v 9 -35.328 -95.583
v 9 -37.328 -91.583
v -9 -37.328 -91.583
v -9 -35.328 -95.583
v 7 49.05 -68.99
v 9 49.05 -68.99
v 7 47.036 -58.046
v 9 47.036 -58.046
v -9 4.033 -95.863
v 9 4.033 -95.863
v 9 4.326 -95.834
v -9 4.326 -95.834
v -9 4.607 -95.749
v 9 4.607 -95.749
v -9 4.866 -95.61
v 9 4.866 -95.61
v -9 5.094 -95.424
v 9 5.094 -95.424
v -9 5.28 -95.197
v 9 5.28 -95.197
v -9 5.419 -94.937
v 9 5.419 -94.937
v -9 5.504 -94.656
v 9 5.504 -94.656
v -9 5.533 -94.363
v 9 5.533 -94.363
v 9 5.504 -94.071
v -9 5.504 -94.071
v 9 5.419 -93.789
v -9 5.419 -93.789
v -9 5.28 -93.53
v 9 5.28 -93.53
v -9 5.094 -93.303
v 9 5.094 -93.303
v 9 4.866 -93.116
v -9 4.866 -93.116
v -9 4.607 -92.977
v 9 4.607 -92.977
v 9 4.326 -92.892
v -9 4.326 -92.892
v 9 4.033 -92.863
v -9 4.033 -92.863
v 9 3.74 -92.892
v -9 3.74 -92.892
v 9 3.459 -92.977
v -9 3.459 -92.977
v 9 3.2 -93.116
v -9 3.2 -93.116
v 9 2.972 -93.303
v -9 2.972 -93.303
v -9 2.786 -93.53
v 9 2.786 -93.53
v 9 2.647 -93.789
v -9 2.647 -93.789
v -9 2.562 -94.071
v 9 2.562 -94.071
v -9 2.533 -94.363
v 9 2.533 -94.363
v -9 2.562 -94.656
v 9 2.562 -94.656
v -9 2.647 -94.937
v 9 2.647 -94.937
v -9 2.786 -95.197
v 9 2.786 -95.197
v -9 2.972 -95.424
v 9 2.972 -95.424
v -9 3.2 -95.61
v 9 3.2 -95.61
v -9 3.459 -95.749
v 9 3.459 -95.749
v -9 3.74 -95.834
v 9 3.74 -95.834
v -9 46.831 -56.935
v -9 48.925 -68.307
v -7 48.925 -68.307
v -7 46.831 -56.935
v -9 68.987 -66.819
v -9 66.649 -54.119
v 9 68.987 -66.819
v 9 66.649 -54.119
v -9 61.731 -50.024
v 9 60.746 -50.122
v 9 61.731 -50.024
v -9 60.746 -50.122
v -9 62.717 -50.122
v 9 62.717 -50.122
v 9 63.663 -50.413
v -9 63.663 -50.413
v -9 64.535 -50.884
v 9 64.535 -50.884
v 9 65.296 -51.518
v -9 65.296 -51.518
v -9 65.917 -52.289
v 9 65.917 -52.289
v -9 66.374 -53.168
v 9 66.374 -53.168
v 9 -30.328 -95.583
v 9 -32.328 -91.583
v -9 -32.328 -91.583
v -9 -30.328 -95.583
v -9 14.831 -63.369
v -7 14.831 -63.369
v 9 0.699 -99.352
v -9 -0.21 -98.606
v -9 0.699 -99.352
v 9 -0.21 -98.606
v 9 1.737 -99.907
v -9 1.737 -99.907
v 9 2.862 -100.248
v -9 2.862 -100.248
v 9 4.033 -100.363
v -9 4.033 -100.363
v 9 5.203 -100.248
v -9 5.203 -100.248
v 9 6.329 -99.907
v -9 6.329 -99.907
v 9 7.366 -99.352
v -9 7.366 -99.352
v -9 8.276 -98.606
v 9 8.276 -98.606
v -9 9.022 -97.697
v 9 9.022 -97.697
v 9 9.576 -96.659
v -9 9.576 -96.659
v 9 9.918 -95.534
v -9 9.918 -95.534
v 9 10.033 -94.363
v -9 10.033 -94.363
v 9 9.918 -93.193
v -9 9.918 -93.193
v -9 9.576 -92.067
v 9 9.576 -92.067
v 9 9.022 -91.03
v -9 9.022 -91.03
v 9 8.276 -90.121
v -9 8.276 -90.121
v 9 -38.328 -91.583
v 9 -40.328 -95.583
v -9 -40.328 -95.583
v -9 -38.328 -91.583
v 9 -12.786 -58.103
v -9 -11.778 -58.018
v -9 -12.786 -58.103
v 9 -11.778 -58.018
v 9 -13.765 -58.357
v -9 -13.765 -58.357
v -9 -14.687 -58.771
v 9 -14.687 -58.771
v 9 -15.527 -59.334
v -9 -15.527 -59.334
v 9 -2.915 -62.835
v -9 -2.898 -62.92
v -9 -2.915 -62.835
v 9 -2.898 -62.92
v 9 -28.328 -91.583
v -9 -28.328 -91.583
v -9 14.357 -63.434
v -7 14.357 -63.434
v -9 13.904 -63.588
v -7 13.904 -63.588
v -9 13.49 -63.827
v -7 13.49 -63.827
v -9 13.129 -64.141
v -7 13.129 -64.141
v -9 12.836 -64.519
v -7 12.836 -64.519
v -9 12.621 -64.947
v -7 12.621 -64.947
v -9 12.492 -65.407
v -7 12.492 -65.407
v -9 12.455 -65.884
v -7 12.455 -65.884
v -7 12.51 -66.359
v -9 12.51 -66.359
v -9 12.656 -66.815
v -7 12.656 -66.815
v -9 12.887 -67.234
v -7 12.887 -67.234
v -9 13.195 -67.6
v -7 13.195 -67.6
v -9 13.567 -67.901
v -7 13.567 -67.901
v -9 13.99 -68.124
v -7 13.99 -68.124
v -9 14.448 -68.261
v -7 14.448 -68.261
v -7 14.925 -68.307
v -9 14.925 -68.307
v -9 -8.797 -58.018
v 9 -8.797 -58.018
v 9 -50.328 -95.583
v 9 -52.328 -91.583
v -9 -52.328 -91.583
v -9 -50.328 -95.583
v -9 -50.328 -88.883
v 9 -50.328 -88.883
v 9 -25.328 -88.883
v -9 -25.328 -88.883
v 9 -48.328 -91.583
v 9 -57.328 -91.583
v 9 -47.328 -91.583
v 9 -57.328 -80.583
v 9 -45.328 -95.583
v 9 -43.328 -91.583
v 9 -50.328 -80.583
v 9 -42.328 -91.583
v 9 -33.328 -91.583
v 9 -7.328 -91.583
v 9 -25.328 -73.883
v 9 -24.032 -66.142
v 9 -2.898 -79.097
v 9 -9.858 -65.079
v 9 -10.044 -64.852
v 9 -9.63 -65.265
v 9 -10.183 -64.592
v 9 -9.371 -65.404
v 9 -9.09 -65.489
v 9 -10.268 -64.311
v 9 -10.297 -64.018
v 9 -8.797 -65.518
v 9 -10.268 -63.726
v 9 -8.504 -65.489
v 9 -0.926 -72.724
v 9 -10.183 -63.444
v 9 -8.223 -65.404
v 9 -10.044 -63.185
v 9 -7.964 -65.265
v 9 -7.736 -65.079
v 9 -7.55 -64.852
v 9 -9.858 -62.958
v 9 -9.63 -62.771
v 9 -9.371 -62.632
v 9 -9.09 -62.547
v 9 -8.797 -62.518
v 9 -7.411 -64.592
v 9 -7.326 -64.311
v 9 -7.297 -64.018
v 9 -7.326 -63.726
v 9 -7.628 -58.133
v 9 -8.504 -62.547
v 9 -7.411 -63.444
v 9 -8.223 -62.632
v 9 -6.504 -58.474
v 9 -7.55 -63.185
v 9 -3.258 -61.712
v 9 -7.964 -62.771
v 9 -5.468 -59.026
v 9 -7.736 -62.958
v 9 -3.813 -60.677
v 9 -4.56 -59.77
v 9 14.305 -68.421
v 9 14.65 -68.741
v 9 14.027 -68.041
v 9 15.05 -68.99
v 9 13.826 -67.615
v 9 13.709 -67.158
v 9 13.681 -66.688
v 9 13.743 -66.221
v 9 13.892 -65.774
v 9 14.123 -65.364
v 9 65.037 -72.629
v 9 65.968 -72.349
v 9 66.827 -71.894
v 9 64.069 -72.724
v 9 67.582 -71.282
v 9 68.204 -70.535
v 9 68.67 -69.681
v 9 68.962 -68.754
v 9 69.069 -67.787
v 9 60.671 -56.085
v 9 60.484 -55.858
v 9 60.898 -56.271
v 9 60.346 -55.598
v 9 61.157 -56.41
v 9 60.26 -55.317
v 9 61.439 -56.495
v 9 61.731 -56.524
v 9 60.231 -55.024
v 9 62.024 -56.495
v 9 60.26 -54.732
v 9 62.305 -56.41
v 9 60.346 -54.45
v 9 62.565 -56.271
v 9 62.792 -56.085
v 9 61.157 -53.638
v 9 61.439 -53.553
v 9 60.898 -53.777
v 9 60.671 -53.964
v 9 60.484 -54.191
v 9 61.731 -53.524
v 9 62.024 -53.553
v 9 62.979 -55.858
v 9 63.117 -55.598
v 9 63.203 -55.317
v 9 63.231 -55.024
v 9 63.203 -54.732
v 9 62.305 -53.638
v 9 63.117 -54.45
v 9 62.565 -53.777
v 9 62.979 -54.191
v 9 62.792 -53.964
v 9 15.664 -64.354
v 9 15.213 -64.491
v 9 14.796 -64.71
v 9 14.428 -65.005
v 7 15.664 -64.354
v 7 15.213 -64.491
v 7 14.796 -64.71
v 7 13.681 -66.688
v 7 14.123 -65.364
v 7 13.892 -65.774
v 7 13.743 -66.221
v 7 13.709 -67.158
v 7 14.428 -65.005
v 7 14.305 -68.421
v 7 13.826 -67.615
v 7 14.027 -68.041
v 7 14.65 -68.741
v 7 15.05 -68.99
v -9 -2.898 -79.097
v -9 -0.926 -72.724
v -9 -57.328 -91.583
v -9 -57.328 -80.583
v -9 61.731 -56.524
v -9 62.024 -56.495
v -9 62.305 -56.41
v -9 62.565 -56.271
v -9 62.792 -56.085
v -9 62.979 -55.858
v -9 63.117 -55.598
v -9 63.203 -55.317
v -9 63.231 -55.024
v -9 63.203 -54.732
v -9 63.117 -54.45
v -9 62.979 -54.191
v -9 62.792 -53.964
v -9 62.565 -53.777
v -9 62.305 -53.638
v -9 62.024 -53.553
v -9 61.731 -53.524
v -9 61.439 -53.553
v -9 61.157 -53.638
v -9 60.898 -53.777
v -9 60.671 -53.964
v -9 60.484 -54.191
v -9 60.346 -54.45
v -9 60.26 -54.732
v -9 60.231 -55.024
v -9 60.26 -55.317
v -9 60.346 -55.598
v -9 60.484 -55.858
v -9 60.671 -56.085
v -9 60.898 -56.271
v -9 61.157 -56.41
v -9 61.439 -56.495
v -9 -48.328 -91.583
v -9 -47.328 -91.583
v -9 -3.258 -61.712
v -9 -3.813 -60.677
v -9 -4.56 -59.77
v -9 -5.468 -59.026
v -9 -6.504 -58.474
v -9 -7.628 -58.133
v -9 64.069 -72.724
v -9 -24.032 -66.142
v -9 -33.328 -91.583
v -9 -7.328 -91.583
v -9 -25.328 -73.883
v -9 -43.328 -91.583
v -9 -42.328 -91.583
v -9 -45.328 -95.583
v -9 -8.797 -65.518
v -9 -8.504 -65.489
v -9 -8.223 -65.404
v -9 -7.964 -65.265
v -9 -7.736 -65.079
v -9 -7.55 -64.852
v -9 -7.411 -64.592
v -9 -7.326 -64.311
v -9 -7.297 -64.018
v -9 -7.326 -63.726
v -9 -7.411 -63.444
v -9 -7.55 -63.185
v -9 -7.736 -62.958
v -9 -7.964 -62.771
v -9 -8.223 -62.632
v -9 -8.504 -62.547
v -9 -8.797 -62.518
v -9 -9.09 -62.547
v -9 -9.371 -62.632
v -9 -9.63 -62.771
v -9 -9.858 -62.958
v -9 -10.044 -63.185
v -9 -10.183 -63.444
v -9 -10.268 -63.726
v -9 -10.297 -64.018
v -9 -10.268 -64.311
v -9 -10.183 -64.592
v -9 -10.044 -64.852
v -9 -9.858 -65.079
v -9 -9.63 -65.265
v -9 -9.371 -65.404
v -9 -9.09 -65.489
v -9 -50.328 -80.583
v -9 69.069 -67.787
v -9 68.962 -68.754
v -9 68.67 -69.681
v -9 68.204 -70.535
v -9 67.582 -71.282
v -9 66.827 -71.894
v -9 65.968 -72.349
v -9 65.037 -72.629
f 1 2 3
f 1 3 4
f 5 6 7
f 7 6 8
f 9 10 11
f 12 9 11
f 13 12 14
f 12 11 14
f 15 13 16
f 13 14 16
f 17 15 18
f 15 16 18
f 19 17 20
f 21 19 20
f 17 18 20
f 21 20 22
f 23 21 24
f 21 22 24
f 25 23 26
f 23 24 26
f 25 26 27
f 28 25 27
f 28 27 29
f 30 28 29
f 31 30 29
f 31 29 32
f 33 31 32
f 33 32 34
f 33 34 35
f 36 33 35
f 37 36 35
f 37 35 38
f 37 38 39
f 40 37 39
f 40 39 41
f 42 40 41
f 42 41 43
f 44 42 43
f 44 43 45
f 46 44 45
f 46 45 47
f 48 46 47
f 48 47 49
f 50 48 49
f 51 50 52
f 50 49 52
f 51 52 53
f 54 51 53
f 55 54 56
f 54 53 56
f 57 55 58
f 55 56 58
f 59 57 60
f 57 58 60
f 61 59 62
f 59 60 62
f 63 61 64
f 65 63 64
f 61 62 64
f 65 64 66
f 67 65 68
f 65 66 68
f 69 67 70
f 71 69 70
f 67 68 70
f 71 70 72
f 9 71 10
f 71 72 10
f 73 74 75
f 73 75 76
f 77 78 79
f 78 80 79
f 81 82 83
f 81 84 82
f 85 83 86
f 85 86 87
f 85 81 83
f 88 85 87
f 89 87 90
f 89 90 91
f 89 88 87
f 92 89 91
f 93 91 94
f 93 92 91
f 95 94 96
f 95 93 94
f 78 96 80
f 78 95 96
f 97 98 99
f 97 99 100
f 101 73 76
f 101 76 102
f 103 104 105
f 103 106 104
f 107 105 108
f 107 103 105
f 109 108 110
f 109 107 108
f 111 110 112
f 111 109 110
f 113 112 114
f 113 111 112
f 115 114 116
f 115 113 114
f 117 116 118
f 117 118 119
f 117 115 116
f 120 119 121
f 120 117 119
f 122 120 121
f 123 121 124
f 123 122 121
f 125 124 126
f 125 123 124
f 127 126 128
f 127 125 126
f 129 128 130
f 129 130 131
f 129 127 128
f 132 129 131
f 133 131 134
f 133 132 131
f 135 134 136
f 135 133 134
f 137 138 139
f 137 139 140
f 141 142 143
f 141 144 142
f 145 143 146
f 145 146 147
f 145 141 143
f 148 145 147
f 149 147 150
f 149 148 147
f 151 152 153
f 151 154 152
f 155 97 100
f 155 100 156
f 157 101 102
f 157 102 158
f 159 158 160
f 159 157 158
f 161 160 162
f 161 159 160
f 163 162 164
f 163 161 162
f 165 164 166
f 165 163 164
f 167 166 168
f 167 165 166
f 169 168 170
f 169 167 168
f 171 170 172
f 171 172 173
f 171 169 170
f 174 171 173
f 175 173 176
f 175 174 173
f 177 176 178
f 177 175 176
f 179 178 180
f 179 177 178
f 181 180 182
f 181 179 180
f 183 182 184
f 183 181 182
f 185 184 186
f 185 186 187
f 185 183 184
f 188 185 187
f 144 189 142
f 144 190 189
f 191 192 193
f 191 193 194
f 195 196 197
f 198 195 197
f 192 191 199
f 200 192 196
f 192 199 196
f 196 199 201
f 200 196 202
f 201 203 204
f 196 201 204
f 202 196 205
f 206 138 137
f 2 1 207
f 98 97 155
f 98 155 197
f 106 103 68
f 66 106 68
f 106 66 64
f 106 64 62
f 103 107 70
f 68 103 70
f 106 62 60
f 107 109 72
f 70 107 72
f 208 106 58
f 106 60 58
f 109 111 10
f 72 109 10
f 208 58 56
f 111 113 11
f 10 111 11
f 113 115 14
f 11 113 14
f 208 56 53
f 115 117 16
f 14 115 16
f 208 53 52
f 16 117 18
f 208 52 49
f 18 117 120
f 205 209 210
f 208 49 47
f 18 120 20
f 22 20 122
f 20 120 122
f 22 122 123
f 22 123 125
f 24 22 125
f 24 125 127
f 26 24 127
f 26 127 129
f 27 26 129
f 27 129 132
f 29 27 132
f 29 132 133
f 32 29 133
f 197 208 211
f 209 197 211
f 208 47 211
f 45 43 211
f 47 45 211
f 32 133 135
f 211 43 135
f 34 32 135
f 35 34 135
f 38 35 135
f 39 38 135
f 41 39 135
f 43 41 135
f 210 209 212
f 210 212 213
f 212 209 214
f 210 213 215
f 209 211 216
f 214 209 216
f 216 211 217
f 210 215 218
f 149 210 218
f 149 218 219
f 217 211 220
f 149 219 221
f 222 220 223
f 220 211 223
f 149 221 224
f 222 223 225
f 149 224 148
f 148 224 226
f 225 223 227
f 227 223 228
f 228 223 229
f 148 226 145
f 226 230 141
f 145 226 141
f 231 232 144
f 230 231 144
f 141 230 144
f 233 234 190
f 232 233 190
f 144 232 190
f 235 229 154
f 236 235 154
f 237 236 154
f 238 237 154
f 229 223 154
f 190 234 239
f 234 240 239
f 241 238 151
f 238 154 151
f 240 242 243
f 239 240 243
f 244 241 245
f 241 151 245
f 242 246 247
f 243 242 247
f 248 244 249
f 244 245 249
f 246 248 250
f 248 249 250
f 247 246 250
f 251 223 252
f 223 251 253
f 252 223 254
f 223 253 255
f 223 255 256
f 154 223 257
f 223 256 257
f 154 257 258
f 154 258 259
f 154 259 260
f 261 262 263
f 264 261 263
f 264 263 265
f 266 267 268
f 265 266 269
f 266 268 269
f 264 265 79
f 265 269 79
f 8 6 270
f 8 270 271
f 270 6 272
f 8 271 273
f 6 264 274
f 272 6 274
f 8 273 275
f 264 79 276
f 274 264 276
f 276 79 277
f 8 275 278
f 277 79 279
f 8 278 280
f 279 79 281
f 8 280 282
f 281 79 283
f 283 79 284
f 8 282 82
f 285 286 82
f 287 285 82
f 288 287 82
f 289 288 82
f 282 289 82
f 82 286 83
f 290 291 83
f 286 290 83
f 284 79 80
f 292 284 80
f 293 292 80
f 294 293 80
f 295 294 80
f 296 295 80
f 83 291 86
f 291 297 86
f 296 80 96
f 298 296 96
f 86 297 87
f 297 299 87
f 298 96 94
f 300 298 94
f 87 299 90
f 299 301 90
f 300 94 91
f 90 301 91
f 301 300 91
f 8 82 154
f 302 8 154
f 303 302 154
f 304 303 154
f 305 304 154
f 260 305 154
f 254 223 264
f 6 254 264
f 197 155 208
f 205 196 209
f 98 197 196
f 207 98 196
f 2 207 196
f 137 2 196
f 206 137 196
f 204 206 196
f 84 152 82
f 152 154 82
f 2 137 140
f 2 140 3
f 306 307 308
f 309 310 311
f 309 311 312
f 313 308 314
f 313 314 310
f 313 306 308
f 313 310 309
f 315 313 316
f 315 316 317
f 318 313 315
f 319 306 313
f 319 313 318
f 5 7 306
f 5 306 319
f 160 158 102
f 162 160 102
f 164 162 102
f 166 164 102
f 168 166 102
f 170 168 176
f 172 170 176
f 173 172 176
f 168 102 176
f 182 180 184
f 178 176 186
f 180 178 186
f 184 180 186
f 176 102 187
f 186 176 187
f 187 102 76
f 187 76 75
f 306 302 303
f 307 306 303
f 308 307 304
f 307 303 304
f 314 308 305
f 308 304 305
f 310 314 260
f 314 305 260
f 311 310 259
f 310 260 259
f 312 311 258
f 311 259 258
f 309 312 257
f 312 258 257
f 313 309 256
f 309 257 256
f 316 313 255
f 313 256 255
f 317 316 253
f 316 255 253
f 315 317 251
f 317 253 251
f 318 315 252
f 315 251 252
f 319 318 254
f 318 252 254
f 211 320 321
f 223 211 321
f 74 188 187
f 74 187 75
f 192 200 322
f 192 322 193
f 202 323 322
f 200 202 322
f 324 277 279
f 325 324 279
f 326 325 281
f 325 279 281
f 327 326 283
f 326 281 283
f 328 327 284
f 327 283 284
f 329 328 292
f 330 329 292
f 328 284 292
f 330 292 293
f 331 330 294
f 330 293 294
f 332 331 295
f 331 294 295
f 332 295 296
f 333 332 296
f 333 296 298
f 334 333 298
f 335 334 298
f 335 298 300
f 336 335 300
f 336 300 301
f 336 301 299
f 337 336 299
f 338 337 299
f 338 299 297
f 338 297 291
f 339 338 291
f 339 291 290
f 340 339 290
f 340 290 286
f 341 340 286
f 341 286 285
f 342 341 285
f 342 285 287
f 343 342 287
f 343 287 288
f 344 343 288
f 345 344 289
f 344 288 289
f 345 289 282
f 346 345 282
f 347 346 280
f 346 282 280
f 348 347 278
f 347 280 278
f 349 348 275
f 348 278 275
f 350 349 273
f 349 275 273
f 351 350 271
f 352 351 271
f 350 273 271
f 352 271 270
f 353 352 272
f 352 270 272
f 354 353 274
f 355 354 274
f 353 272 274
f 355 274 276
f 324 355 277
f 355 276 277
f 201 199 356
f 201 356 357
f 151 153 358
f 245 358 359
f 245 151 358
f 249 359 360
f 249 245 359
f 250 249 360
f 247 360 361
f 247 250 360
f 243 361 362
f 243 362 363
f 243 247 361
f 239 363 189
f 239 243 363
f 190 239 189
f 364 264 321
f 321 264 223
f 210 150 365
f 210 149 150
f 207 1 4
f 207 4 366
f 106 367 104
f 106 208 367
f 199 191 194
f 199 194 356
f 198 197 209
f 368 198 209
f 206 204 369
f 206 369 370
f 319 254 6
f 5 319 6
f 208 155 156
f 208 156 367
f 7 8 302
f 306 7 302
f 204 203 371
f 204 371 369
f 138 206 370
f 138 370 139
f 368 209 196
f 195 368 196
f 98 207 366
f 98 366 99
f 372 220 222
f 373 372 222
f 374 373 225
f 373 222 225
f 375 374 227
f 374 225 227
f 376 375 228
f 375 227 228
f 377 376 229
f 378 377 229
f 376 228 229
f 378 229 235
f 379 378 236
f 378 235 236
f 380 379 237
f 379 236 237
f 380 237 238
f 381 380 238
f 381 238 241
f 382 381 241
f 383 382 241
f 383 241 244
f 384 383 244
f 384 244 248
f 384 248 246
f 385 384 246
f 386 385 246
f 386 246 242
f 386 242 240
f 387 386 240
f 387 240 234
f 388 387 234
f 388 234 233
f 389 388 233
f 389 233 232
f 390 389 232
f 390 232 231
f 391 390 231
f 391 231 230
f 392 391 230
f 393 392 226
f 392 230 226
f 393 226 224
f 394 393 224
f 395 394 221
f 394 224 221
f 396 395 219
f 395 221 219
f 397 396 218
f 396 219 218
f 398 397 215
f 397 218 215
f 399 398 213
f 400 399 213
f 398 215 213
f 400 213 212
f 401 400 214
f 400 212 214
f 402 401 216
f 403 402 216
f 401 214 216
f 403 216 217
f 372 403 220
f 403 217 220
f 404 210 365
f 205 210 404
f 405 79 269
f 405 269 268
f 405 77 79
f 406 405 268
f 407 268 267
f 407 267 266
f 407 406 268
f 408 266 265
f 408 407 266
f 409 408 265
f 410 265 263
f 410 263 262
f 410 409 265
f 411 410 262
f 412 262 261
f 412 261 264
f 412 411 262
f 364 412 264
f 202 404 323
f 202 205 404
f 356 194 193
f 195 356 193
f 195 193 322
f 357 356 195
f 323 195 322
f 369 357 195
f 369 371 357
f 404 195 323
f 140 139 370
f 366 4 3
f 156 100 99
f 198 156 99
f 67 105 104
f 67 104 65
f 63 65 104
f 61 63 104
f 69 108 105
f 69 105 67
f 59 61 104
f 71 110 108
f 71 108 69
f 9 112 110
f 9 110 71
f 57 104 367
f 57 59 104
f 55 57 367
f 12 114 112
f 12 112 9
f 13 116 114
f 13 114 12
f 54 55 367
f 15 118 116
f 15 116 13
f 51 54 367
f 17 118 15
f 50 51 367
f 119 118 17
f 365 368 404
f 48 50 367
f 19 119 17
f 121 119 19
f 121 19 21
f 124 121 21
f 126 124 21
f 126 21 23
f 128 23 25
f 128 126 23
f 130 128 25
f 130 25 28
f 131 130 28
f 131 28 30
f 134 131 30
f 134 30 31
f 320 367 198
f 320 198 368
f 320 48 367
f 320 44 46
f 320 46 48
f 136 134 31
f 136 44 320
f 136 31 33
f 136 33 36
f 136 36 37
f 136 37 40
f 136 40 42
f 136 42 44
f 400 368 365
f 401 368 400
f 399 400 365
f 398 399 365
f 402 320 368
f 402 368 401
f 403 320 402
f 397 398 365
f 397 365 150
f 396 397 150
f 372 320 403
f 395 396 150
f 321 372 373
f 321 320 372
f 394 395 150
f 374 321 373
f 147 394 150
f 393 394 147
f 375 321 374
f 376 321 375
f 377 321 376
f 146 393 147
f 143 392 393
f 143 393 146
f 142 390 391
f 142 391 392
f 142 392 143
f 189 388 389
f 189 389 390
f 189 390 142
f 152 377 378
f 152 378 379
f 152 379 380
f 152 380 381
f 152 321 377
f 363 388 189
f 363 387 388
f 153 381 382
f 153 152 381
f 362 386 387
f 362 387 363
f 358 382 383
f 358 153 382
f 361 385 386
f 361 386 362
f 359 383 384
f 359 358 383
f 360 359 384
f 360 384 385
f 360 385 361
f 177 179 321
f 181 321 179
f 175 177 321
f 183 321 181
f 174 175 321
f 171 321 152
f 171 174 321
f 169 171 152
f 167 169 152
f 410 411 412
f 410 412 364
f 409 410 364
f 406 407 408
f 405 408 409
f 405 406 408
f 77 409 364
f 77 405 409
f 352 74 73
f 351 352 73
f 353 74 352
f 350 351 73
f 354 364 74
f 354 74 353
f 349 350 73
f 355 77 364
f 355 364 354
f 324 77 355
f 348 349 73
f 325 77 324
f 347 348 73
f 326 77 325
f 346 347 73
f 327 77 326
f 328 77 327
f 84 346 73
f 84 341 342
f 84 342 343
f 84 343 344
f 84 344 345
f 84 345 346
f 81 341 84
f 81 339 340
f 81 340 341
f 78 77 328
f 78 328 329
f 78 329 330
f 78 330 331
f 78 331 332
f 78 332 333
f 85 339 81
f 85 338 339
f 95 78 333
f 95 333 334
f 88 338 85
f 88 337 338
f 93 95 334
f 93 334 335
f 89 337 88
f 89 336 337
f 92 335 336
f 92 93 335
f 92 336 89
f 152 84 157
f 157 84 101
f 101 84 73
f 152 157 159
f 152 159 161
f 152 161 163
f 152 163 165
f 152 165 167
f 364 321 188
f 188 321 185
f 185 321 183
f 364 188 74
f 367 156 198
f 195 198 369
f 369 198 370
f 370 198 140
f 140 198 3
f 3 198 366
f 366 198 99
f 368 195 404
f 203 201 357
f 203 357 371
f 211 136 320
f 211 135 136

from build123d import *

# Parameters (mm, degrees)
BOSS_EXTRUDE1_DEPTH = 9
CUT_EXTRUDE1_DEPTH  = 25
BOSS_EXTRUDE2_DEPTH = 18
LPATTERN1_COUNT     = 5
LPATTERN1_PITCH     = 5
FILLET1_R           = 6
FILLET2_R           = 5
SKETCH4_R           = 1.5
CUT_EXTRUDE2_DEPTH  = 25
SKETCH5_R           = 1.5
CUT_EXTRUDE3_DEPTH  = 25
CUT_EXTRUDE4_DEPTH  = 2
CUT_EXTRUDE5_DEPTH  = 2


with BuildPart() as part:
    # Sketch1 → Boss-Extrude1 (new, symmetric)
    with BuildSketch(Plane(origin=(0, 0, 0), x_dir=(0, 0, -1), z_dir=(1, 0, 0))):
        Polygon((72.723807427, -0.926412344), (62.92004934, -2.897789372), (49.12041015, 65.728517233), (72.723807427, 70.073587656), align=None)
        Polygon((91.582675421, -7.328280768), (98.60593402, -0.20972483), (90.120652646, 8.275556545), (79.096697455, -2.897980722), (72.723807427, -0.926412344), (62.92004934, -2.897789372), (58.018170297, -3.883477885), (58.018170297, -13.883477885), (66.142055029, -24.032492461), (80.582675421, -50.328280768), (80.582675421, -57.328280768), (91.582675421, -57.328280768), align=None)
        with BuildLine():
            ThreePointArc((98.60593402, -0.20972483), (98.60593402, 8.275556545), (90.120652646, 8.275556545))
            Line((90.120652646, 8.275556545), (98.60593402, -0.20972483))
        make_face()
    extrude(amount=BOSS_EXTRUDE1_DEPTH, both=True)

    # Sketch2 → Cut-Extrude1 (cut)
    with BuildSketch(Plane(origin=(9, 0, 0), x_dir=(0, 0, -1), z_dir=(1, 0, 0))):
        Polygon((88.882675421, -50.328280768), (88.882675421, -25.328280768), (73.882675421, -25.328280768), align=None)
    extrude(amount=-CUT_EXTRUDE1_DEPTH, mode=Mode.SUBTRACT)

    # Sketch3 → Boss-Extrude2 (add)
    with BuildSketch(Plane(origin=(9, 0, 0), x_dir=(0, 0, -1), z_dir=(1, 0, 0))):
        Polygon((91.582675421, -50.328280768), (91.582675421, -52.328280768), (95.582675421, -50.328280768), align=None)
        Polygon((91.582675421, -50.328280768), (95.582675421, -50.328280768), (91.582675421, -48.328280768), align=None)
    boss_extrude2 = extrude(amount=-BOSS_EXTRUDE2_DEPTH)

    # LPattern1: Boss-Extrude2 ×5
    with Locations(*[(0, i * LPATTERN1_PITCH, 0) for i in range(1, LPATTERN1_COUNT)]):
        add(boss_extrude2)

    # Fillet1
    fillet1_edges = [part.edges().sort_by_distance(p)[0] for p in [
        (0, -13.883477885, -58.018170297),
        (0, -3.883477885, -58.018170297),
    ]]
    fillet(fillet1_edges, radius=FILLET1_R)

    # Fillet2
    fillet2_edges = [part.edges().sort_by_distance(p)[0] for p in [
        (0, 65.728517233, -49.12041015),
        (0, 70.073587656, -72.723807427),
    ]]
    fillet(fillet2_edges, radius=FILLET2_R)

    # Sketch4 → Cut-Extrude2 (cut)
    with BuildSketch(Plane(origin=(9, 0, 0), x_dir=(0, 0, -1), z_dir=(1, 0, 0))):
        with Locations((55.024265961, 61.731324387)):
            Circle(SKETCH4_R)
    extrude(amount=-CUT_EXTRUDE2_DEPTH, mode=Mode.SUBTRACT)

    # Sketch5 → Cut-Extrude3 (cut)
    with BuildSketch(Plane(origin=(9, 0, 0), x_dir=(0, 0, -1), z_dir=(1, 0, 0))):
        with Locations((94.363293333, 4.032915857)):
            Circle(SKETCH5_R)
        with Locations((64.018170297, -8.79707708)):
            Circle(SKETCH5_R)
    extrude(amount=-CUT_EXTRUDE3_DEPTH, mode=Mode.SUBTRACT)

    # Sketch6 → Cut-Extrude4 (cut)
    with BuildSketch(Plane(origin=(9, 0, 0), x_dir=(0, 0, -1), z_dir=(1, 0, 0))):
        with BuildLine():
            Line((68.990160428, 15.050217447), (68.990160428, 49.050217447))
            Line((68.990160428, 49.050217447), (58.046044594, 47.035551784))
            Line((58.046044594, 47.035551784), (64.354451081, 15.663525908))
            ThreePointArc((64.354451081, 15.663525908), (66.453192239, 13.700695979), (68.990160428, 15.050217447))
        make_face()
    extrude(amount=-CUT_EXTRUDE4_DEPTH, mode=Mode.SUBTRACT)

    # Sketch7 → Cut-Extrude5 (cut)
    with BuildSketch(Plane.ZY.offset(9)):
        with BuildLine():
            Line((-68.307430595, 48.924535996), (-56.93452281, 46.830935459))
            Line((-56.93452281, 46.830935459), (-63.369204726, 14.830935459))
            ThreePointArc((-63.369204726, 14.830935459), (-65.88423927, 12.454979569), (-68.307430595, 14.924535996))
            Line((-68.307430595, 14.924535996), (-68.307430595, 48.924535996))
        make_face()
    extrude(amount=-CUT_EXTRUDE5_DEPTH, mode=Mode.SUBTRACT)


solid = part.part
